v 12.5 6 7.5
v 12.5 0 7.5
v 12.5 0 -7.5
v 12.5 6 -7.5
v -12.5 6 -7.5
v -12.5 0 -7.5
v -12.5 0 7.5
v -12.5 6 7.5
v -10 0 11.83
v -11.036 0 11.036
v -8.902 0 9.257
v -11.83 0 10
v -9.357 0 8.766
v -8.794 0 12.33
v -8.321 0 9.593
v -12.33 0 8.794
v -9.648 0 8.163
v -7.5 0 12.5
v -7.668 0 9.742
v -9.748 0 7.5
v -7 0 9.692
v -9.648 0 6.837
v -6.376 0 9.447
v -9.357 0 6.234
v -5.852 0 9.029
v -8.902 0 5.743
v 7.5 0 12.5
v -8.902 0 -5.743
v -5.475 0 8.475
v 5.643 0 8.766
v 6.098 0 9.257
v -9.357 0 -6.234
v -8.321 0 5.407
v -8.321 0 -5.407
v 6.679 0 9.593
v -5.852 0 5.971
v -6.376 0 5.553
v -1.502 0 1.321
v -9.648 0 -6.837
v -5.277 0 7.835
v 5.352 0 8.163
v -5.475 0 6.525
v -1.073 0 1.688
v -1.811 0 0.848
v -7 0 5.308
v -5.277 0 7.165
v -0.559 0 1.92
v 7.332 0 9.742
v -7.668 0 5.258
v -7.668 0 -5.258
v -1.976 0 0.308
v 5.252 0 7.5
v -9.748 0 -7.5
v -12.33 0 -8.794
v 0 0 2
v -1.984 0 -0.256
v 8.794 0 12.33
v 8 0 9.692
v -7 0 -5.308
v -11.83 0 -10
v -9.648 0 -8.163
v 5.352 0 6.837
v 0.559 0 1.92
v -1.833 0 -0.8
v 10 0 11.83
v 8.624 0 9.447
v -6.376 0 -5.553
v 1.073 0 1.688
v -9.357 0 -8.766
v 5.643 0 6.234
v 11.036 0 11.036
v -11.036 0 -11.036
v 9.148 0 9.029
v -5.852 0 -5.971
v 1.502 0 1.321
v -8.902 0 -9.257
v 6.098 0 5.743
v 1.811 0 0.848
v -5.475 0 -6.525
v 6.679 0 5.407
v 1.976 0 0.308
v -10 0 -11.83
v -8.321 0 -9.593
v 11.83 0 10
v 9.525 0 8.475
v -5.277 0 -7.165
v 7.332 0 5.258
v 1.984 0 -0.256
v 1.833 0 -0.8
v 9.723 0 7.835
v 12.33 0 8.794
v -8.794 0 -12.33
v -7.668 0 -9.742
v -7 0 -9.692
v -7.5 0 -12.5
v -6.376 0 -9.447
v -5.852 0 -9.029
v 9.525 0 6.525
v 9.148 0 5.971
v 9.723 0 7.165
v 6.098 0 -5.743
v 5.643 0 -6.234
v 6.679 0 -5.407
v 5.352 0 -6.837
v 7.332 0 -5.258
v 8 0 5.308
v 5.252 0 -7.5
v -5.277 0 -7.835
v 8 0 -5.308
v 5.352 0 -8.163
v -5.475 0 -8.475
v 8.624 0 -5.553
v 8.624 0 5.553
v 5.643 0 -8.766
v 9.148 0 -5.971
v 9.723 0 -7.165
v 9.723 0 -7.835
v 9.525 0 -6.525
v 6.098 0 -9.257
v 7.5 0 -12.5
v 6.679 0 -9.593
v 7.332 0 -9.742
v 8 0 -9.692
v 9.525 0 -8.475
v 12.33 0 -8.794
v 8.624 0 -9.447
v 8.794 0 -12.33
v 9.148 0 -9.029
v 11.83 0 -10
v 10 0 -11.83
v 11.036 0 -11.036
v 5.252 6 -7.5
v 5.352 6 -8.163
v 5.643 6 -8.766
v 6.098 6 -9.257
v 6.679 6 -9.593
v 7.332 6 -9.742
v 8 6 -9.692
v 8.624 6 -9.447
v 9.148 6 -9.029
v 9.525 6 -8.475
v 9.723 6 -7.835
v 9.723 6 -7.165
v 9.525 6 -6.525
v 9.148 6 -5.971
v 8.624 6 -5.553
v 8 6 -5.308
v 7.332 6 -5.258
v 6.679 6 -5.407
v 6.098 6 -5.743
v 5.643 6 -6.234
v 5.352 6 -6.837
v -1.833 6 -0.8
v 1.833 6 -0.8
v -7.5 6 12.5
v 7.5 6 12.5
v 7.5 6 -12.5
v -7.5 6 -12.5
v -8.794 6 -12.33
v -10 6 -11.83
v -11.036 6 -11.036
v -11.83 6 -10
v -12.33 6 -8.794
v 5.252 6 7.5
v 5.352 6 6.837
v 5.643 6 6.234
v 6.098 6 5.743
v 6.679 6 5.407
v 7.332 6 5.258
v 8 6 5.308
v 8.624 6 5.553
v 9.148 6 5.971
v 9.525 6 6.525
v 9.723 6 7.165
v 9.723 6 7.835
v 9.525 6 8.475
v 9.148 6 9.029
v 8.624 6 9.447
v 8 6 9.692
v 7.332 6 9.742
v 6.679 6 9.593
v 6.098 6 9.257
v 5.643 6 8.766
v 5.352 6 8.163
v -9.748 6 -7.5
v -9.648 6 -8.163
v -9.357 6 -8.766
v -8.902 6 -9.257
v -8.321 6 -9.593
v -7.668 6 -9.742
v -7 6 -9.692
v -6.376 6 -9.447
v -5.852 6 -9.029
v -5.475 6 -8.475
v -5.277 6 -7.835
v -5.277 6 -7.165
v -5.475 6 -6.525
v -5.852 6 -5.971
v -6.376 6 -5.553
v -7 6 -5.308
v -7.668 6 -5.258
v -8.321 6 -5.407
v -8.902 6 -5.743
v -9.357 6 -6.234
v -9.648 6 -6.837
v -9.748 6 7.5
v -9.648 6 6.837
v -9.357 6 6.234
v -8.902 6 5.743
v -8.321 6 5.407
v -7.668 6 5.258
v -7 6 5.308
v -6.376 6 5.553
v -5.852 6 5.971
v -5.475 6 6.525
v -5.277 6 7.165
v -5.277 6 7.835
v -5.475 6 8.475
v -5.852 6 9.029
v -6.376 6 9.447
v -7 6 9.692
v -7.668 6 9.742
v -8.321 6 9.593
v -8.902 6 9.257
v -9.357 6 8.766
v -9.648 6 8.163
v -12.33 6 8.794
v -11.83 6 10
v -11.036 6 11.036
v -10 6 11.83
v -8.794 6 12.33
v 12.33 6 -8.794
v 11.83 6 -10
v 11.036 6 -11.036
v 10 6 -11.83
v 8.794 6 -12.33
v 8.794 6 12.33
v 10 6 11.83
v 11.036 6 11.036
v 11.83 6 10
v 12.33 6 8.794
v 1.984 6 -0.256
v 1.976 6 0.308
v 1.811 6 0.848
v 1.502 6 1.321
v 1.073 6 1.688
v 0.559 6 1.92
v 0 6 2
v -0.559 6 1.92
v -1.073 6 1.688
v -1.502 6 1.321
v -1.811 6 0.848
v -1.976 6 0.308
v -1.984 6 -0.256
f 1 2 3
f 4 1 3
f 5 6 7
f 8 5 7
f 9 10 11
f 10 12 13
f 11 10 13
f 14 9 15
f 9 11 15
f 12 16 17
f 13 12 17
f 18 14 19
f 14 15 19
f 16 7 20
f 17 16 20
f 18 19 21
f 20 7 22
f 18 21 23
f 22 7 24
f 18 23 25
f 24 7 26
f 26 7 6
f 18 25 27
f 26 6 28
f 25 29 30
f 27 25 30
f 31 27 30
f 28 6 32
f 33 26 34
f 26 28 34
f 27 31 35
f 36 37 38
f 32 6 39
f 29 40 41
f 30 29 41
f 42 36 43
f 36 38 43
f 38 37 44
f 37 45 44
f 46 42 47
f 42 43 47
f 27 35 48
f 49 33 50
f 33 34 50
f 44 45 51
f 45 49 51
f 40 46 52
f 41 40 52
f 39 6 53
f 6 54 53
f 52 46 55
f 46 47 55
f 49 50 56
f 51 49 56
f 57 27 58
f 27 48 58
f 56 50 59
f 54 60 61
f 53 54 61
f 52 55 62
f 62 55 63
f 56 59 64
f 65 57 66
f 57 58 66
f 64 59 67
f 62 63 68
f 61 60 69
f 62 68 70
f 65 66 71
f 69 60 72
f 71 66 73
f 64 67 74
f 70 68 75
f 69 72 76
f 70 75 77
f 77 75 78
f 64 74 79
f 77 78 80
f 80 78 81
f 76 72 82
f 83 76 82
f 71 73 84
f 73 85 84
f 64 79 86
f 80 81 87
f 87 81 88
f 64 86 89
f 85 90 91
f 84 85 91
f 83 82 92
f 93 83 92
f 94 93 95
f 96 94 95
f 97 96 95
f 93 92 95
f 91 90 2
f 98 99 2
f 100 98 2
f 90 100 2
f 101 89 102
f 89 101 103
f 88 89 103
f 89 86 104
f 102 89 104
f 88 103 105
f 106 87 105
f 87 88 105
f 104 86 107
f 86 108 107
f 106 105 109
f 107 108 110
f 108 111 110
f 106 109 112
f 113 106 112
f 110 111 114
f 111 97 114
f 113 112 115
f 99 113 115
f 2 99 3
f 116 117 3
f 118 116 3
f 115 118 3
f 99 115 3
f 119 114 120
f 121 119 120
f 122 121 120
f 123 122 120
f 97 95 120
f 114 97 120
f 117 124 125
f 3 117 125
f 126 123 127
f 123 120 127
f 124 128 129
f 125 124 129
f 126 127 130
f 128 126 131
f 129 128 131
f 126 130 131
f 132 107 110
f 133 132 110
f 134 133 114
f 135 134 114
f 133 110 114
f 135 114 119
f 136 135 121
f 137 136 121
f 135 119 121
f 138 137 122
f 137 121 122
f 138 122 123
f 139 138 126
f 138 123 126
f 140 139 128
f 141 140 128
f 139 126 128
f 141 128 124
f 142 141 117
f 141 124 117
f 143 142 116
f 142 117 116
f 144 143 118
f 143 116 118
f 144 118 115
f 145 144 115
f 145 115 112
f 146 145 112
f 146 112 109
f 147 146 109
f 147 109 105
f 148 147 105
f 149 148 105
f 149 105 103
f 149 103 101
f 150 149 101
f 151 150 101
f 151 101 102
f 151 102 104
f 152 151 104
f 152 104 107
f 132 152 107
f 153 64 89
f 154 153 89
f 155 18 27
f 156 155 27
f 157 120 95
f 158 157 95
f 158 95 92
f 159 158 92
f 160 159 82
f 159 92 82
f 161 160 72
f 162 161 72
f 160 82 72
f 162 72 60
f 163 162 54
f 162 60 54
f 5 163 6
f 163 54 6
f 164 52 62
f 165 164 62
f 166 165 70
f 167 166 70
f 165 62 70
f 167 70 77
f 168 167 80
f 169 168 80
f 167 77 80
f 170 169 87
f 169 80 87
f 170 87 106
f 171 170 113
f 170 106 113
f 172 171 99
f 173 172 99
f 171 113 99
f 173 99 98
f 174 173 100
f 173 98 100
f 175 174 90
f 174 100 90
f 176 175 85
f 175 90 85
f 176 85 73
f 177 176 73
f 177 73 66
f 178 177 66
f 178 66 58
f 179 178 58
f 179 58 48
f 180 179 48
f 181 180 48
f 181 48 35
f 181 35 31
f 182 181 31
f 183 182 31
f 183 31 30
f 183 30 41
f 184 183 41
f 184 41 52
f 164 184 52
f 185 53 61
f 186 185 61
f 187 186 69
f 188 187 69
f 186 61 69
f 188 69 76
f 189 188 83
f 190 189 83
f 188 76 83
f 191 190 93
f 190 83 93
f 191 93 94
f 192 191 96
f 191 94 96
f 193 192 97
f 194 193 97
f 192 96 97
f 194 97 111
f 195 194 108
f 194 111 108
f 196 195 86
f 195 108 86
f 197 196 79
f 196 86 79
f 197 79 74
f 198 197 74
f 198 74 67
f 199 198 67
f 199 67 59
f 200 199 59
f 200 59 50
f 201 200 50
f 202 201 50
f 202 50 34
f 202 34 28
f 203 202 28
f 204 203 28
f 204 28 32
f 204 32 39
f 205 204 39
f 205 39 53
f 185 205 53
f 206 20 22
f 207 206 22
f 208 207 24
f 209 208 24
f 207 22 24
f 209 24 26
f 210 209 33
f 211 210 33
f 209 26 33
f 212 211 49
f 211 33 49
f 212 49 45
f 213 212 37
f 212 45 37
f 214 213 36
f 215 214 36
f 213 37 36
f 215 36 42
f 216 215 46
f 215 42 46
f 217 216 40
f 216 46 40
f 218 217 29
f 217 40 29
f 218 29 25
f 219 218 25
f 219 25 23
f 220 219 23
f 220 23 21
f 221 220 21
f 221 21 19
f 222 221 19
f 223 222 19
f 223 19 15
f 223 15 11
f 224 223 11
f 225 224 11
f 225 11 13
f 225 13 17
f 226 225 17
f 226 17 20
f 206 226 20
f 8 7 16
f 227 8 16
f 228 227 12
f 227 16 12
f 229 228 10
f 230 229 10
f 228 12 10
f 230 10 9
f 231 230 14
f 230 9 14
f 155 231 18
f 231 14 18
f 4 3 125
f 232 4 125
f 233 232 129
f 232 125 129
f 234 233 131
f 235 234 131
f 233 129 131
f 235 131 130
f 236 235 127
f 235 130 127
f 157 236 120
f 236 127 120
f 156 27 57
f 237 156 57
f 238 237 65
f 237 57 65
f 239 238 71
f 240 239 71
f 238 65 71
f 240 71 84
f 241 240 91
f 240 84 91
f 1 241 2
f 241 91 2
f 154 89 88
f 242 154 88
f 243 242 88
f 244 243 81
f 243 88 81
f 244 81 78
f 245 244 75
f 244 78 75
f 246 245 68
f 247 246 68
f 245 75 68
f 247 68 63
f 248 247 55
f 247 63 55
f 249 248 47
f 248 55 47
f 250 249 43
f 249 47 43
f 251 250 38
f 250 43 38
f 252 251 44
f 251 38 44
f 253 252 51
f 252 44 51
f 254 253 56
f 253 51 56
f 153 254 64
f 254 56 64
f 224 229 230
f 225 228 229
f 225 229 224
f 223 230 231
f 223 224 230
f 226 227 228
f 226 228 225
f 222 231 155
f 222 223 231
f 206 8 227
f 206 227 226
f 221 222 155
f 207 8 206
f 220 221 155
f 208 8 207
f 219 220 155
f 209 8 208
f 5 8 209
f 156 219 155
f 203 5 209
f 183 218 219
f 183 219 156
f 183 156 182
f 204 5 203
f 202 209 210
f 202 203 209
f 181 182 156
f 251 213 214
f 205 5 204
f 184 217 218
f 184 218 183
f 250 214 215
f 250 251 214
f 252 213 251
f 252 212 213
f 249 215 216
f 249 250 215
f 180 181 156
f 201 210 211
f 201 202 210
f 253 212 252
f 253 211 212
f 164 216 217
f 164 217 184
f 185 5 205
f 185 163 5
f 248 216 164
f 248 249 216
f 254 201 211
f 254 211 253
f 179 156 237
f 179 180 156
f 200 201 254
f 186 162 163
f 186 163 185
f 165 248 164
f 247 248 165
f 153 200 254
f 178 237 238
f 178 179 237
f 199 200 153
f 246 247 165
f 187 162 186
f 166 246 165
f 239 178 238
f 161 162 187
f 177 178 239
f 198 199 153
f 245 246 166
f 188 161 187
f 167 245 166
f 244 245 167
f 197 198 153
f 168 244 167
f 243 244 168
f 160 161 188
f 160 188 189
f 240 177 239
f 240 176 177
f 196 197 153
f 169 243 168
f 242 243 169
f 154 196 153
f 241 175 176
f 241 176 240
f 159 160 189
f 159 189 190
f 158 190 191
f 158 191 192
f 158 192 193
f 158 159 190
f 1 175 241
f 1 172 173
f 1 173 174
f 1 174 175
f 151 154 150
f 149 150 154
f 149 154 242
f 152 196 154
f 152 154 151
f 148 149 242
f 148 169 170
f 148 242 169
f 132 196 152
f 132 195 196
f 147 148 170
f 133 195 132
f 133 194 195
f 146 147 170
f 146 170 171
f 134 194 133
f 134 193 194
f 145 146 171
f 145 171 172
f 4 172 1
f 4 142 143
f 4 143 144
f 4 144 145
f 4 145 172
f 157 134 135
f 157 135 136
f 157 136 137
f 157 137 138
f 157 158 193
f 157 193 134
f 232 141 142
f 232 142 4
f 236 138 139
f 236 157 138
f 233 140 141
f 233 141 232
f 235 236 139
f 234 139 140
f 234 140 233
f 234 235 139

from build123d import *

# Parameters (mm, degrees)
BOSS_EXTRUDE1_DEPTH   = 6
F_8_CLEARANCE_HOLE1_D = 4.4958


with BuildPart() as part:
    # Sketch1 → Boss-Extrude1 (new body)
    with BuildSketch(Plane(origin=(0, 0, 0), x_dir=(1, 0, 0), z_dir=(0, 1, 0))):
        with BuildLine():
            Line((7.5, 12.5), (-7.5, 12.5))
            ThreePointArc((-7.5, 12.5), (-11.035533906, 11.035533906), (-12.5, 7.5))
            Line((-12.5, 7.5), (-12.5, -7.5))
            ThreePointArc((-12.5, -7.5), (-11.035533906, -11.035533906), (-7.5, -12.5))
            Line((-7.5, -12.5), (7.5, -12.5))
            ThreePointArc((7.5, -12.5), (11.035533906, -11.035533906), (12.5, -7.5))
            Line((12.5, -7.5), (12.5, 7.5))
            ThreePointArc((12.5, 7.5), (11.035533906, 11.035533906), (7.5, 12.5))
        make_face()
        with BuildLine():
            Line((-1.833030278, 0.8), (1.833030278, 0.8))
            ThreePointArc((1.833030278, 0.8), (0, -2), (-1.833030278, 0.8))
        make_face(mode=Mode.SUBTRACT)
    extrude(amount=BOSS_EXTRUDE1_DEPTH)

    # #8 Clearance Hole1 (through all)
    with Locations(Plane(origin=(0, 6, 0), x_dir=(1, 0, 0), z_dir=(0, 1, 0))):
        with Locations((-7.5, 7.5), (7.5, 7.5), (-7.5, -7.5), (7.5, -7.5)):
            Hole(F_8_CLEARANCE_HOLE1_D / 2)


solid = part.part
